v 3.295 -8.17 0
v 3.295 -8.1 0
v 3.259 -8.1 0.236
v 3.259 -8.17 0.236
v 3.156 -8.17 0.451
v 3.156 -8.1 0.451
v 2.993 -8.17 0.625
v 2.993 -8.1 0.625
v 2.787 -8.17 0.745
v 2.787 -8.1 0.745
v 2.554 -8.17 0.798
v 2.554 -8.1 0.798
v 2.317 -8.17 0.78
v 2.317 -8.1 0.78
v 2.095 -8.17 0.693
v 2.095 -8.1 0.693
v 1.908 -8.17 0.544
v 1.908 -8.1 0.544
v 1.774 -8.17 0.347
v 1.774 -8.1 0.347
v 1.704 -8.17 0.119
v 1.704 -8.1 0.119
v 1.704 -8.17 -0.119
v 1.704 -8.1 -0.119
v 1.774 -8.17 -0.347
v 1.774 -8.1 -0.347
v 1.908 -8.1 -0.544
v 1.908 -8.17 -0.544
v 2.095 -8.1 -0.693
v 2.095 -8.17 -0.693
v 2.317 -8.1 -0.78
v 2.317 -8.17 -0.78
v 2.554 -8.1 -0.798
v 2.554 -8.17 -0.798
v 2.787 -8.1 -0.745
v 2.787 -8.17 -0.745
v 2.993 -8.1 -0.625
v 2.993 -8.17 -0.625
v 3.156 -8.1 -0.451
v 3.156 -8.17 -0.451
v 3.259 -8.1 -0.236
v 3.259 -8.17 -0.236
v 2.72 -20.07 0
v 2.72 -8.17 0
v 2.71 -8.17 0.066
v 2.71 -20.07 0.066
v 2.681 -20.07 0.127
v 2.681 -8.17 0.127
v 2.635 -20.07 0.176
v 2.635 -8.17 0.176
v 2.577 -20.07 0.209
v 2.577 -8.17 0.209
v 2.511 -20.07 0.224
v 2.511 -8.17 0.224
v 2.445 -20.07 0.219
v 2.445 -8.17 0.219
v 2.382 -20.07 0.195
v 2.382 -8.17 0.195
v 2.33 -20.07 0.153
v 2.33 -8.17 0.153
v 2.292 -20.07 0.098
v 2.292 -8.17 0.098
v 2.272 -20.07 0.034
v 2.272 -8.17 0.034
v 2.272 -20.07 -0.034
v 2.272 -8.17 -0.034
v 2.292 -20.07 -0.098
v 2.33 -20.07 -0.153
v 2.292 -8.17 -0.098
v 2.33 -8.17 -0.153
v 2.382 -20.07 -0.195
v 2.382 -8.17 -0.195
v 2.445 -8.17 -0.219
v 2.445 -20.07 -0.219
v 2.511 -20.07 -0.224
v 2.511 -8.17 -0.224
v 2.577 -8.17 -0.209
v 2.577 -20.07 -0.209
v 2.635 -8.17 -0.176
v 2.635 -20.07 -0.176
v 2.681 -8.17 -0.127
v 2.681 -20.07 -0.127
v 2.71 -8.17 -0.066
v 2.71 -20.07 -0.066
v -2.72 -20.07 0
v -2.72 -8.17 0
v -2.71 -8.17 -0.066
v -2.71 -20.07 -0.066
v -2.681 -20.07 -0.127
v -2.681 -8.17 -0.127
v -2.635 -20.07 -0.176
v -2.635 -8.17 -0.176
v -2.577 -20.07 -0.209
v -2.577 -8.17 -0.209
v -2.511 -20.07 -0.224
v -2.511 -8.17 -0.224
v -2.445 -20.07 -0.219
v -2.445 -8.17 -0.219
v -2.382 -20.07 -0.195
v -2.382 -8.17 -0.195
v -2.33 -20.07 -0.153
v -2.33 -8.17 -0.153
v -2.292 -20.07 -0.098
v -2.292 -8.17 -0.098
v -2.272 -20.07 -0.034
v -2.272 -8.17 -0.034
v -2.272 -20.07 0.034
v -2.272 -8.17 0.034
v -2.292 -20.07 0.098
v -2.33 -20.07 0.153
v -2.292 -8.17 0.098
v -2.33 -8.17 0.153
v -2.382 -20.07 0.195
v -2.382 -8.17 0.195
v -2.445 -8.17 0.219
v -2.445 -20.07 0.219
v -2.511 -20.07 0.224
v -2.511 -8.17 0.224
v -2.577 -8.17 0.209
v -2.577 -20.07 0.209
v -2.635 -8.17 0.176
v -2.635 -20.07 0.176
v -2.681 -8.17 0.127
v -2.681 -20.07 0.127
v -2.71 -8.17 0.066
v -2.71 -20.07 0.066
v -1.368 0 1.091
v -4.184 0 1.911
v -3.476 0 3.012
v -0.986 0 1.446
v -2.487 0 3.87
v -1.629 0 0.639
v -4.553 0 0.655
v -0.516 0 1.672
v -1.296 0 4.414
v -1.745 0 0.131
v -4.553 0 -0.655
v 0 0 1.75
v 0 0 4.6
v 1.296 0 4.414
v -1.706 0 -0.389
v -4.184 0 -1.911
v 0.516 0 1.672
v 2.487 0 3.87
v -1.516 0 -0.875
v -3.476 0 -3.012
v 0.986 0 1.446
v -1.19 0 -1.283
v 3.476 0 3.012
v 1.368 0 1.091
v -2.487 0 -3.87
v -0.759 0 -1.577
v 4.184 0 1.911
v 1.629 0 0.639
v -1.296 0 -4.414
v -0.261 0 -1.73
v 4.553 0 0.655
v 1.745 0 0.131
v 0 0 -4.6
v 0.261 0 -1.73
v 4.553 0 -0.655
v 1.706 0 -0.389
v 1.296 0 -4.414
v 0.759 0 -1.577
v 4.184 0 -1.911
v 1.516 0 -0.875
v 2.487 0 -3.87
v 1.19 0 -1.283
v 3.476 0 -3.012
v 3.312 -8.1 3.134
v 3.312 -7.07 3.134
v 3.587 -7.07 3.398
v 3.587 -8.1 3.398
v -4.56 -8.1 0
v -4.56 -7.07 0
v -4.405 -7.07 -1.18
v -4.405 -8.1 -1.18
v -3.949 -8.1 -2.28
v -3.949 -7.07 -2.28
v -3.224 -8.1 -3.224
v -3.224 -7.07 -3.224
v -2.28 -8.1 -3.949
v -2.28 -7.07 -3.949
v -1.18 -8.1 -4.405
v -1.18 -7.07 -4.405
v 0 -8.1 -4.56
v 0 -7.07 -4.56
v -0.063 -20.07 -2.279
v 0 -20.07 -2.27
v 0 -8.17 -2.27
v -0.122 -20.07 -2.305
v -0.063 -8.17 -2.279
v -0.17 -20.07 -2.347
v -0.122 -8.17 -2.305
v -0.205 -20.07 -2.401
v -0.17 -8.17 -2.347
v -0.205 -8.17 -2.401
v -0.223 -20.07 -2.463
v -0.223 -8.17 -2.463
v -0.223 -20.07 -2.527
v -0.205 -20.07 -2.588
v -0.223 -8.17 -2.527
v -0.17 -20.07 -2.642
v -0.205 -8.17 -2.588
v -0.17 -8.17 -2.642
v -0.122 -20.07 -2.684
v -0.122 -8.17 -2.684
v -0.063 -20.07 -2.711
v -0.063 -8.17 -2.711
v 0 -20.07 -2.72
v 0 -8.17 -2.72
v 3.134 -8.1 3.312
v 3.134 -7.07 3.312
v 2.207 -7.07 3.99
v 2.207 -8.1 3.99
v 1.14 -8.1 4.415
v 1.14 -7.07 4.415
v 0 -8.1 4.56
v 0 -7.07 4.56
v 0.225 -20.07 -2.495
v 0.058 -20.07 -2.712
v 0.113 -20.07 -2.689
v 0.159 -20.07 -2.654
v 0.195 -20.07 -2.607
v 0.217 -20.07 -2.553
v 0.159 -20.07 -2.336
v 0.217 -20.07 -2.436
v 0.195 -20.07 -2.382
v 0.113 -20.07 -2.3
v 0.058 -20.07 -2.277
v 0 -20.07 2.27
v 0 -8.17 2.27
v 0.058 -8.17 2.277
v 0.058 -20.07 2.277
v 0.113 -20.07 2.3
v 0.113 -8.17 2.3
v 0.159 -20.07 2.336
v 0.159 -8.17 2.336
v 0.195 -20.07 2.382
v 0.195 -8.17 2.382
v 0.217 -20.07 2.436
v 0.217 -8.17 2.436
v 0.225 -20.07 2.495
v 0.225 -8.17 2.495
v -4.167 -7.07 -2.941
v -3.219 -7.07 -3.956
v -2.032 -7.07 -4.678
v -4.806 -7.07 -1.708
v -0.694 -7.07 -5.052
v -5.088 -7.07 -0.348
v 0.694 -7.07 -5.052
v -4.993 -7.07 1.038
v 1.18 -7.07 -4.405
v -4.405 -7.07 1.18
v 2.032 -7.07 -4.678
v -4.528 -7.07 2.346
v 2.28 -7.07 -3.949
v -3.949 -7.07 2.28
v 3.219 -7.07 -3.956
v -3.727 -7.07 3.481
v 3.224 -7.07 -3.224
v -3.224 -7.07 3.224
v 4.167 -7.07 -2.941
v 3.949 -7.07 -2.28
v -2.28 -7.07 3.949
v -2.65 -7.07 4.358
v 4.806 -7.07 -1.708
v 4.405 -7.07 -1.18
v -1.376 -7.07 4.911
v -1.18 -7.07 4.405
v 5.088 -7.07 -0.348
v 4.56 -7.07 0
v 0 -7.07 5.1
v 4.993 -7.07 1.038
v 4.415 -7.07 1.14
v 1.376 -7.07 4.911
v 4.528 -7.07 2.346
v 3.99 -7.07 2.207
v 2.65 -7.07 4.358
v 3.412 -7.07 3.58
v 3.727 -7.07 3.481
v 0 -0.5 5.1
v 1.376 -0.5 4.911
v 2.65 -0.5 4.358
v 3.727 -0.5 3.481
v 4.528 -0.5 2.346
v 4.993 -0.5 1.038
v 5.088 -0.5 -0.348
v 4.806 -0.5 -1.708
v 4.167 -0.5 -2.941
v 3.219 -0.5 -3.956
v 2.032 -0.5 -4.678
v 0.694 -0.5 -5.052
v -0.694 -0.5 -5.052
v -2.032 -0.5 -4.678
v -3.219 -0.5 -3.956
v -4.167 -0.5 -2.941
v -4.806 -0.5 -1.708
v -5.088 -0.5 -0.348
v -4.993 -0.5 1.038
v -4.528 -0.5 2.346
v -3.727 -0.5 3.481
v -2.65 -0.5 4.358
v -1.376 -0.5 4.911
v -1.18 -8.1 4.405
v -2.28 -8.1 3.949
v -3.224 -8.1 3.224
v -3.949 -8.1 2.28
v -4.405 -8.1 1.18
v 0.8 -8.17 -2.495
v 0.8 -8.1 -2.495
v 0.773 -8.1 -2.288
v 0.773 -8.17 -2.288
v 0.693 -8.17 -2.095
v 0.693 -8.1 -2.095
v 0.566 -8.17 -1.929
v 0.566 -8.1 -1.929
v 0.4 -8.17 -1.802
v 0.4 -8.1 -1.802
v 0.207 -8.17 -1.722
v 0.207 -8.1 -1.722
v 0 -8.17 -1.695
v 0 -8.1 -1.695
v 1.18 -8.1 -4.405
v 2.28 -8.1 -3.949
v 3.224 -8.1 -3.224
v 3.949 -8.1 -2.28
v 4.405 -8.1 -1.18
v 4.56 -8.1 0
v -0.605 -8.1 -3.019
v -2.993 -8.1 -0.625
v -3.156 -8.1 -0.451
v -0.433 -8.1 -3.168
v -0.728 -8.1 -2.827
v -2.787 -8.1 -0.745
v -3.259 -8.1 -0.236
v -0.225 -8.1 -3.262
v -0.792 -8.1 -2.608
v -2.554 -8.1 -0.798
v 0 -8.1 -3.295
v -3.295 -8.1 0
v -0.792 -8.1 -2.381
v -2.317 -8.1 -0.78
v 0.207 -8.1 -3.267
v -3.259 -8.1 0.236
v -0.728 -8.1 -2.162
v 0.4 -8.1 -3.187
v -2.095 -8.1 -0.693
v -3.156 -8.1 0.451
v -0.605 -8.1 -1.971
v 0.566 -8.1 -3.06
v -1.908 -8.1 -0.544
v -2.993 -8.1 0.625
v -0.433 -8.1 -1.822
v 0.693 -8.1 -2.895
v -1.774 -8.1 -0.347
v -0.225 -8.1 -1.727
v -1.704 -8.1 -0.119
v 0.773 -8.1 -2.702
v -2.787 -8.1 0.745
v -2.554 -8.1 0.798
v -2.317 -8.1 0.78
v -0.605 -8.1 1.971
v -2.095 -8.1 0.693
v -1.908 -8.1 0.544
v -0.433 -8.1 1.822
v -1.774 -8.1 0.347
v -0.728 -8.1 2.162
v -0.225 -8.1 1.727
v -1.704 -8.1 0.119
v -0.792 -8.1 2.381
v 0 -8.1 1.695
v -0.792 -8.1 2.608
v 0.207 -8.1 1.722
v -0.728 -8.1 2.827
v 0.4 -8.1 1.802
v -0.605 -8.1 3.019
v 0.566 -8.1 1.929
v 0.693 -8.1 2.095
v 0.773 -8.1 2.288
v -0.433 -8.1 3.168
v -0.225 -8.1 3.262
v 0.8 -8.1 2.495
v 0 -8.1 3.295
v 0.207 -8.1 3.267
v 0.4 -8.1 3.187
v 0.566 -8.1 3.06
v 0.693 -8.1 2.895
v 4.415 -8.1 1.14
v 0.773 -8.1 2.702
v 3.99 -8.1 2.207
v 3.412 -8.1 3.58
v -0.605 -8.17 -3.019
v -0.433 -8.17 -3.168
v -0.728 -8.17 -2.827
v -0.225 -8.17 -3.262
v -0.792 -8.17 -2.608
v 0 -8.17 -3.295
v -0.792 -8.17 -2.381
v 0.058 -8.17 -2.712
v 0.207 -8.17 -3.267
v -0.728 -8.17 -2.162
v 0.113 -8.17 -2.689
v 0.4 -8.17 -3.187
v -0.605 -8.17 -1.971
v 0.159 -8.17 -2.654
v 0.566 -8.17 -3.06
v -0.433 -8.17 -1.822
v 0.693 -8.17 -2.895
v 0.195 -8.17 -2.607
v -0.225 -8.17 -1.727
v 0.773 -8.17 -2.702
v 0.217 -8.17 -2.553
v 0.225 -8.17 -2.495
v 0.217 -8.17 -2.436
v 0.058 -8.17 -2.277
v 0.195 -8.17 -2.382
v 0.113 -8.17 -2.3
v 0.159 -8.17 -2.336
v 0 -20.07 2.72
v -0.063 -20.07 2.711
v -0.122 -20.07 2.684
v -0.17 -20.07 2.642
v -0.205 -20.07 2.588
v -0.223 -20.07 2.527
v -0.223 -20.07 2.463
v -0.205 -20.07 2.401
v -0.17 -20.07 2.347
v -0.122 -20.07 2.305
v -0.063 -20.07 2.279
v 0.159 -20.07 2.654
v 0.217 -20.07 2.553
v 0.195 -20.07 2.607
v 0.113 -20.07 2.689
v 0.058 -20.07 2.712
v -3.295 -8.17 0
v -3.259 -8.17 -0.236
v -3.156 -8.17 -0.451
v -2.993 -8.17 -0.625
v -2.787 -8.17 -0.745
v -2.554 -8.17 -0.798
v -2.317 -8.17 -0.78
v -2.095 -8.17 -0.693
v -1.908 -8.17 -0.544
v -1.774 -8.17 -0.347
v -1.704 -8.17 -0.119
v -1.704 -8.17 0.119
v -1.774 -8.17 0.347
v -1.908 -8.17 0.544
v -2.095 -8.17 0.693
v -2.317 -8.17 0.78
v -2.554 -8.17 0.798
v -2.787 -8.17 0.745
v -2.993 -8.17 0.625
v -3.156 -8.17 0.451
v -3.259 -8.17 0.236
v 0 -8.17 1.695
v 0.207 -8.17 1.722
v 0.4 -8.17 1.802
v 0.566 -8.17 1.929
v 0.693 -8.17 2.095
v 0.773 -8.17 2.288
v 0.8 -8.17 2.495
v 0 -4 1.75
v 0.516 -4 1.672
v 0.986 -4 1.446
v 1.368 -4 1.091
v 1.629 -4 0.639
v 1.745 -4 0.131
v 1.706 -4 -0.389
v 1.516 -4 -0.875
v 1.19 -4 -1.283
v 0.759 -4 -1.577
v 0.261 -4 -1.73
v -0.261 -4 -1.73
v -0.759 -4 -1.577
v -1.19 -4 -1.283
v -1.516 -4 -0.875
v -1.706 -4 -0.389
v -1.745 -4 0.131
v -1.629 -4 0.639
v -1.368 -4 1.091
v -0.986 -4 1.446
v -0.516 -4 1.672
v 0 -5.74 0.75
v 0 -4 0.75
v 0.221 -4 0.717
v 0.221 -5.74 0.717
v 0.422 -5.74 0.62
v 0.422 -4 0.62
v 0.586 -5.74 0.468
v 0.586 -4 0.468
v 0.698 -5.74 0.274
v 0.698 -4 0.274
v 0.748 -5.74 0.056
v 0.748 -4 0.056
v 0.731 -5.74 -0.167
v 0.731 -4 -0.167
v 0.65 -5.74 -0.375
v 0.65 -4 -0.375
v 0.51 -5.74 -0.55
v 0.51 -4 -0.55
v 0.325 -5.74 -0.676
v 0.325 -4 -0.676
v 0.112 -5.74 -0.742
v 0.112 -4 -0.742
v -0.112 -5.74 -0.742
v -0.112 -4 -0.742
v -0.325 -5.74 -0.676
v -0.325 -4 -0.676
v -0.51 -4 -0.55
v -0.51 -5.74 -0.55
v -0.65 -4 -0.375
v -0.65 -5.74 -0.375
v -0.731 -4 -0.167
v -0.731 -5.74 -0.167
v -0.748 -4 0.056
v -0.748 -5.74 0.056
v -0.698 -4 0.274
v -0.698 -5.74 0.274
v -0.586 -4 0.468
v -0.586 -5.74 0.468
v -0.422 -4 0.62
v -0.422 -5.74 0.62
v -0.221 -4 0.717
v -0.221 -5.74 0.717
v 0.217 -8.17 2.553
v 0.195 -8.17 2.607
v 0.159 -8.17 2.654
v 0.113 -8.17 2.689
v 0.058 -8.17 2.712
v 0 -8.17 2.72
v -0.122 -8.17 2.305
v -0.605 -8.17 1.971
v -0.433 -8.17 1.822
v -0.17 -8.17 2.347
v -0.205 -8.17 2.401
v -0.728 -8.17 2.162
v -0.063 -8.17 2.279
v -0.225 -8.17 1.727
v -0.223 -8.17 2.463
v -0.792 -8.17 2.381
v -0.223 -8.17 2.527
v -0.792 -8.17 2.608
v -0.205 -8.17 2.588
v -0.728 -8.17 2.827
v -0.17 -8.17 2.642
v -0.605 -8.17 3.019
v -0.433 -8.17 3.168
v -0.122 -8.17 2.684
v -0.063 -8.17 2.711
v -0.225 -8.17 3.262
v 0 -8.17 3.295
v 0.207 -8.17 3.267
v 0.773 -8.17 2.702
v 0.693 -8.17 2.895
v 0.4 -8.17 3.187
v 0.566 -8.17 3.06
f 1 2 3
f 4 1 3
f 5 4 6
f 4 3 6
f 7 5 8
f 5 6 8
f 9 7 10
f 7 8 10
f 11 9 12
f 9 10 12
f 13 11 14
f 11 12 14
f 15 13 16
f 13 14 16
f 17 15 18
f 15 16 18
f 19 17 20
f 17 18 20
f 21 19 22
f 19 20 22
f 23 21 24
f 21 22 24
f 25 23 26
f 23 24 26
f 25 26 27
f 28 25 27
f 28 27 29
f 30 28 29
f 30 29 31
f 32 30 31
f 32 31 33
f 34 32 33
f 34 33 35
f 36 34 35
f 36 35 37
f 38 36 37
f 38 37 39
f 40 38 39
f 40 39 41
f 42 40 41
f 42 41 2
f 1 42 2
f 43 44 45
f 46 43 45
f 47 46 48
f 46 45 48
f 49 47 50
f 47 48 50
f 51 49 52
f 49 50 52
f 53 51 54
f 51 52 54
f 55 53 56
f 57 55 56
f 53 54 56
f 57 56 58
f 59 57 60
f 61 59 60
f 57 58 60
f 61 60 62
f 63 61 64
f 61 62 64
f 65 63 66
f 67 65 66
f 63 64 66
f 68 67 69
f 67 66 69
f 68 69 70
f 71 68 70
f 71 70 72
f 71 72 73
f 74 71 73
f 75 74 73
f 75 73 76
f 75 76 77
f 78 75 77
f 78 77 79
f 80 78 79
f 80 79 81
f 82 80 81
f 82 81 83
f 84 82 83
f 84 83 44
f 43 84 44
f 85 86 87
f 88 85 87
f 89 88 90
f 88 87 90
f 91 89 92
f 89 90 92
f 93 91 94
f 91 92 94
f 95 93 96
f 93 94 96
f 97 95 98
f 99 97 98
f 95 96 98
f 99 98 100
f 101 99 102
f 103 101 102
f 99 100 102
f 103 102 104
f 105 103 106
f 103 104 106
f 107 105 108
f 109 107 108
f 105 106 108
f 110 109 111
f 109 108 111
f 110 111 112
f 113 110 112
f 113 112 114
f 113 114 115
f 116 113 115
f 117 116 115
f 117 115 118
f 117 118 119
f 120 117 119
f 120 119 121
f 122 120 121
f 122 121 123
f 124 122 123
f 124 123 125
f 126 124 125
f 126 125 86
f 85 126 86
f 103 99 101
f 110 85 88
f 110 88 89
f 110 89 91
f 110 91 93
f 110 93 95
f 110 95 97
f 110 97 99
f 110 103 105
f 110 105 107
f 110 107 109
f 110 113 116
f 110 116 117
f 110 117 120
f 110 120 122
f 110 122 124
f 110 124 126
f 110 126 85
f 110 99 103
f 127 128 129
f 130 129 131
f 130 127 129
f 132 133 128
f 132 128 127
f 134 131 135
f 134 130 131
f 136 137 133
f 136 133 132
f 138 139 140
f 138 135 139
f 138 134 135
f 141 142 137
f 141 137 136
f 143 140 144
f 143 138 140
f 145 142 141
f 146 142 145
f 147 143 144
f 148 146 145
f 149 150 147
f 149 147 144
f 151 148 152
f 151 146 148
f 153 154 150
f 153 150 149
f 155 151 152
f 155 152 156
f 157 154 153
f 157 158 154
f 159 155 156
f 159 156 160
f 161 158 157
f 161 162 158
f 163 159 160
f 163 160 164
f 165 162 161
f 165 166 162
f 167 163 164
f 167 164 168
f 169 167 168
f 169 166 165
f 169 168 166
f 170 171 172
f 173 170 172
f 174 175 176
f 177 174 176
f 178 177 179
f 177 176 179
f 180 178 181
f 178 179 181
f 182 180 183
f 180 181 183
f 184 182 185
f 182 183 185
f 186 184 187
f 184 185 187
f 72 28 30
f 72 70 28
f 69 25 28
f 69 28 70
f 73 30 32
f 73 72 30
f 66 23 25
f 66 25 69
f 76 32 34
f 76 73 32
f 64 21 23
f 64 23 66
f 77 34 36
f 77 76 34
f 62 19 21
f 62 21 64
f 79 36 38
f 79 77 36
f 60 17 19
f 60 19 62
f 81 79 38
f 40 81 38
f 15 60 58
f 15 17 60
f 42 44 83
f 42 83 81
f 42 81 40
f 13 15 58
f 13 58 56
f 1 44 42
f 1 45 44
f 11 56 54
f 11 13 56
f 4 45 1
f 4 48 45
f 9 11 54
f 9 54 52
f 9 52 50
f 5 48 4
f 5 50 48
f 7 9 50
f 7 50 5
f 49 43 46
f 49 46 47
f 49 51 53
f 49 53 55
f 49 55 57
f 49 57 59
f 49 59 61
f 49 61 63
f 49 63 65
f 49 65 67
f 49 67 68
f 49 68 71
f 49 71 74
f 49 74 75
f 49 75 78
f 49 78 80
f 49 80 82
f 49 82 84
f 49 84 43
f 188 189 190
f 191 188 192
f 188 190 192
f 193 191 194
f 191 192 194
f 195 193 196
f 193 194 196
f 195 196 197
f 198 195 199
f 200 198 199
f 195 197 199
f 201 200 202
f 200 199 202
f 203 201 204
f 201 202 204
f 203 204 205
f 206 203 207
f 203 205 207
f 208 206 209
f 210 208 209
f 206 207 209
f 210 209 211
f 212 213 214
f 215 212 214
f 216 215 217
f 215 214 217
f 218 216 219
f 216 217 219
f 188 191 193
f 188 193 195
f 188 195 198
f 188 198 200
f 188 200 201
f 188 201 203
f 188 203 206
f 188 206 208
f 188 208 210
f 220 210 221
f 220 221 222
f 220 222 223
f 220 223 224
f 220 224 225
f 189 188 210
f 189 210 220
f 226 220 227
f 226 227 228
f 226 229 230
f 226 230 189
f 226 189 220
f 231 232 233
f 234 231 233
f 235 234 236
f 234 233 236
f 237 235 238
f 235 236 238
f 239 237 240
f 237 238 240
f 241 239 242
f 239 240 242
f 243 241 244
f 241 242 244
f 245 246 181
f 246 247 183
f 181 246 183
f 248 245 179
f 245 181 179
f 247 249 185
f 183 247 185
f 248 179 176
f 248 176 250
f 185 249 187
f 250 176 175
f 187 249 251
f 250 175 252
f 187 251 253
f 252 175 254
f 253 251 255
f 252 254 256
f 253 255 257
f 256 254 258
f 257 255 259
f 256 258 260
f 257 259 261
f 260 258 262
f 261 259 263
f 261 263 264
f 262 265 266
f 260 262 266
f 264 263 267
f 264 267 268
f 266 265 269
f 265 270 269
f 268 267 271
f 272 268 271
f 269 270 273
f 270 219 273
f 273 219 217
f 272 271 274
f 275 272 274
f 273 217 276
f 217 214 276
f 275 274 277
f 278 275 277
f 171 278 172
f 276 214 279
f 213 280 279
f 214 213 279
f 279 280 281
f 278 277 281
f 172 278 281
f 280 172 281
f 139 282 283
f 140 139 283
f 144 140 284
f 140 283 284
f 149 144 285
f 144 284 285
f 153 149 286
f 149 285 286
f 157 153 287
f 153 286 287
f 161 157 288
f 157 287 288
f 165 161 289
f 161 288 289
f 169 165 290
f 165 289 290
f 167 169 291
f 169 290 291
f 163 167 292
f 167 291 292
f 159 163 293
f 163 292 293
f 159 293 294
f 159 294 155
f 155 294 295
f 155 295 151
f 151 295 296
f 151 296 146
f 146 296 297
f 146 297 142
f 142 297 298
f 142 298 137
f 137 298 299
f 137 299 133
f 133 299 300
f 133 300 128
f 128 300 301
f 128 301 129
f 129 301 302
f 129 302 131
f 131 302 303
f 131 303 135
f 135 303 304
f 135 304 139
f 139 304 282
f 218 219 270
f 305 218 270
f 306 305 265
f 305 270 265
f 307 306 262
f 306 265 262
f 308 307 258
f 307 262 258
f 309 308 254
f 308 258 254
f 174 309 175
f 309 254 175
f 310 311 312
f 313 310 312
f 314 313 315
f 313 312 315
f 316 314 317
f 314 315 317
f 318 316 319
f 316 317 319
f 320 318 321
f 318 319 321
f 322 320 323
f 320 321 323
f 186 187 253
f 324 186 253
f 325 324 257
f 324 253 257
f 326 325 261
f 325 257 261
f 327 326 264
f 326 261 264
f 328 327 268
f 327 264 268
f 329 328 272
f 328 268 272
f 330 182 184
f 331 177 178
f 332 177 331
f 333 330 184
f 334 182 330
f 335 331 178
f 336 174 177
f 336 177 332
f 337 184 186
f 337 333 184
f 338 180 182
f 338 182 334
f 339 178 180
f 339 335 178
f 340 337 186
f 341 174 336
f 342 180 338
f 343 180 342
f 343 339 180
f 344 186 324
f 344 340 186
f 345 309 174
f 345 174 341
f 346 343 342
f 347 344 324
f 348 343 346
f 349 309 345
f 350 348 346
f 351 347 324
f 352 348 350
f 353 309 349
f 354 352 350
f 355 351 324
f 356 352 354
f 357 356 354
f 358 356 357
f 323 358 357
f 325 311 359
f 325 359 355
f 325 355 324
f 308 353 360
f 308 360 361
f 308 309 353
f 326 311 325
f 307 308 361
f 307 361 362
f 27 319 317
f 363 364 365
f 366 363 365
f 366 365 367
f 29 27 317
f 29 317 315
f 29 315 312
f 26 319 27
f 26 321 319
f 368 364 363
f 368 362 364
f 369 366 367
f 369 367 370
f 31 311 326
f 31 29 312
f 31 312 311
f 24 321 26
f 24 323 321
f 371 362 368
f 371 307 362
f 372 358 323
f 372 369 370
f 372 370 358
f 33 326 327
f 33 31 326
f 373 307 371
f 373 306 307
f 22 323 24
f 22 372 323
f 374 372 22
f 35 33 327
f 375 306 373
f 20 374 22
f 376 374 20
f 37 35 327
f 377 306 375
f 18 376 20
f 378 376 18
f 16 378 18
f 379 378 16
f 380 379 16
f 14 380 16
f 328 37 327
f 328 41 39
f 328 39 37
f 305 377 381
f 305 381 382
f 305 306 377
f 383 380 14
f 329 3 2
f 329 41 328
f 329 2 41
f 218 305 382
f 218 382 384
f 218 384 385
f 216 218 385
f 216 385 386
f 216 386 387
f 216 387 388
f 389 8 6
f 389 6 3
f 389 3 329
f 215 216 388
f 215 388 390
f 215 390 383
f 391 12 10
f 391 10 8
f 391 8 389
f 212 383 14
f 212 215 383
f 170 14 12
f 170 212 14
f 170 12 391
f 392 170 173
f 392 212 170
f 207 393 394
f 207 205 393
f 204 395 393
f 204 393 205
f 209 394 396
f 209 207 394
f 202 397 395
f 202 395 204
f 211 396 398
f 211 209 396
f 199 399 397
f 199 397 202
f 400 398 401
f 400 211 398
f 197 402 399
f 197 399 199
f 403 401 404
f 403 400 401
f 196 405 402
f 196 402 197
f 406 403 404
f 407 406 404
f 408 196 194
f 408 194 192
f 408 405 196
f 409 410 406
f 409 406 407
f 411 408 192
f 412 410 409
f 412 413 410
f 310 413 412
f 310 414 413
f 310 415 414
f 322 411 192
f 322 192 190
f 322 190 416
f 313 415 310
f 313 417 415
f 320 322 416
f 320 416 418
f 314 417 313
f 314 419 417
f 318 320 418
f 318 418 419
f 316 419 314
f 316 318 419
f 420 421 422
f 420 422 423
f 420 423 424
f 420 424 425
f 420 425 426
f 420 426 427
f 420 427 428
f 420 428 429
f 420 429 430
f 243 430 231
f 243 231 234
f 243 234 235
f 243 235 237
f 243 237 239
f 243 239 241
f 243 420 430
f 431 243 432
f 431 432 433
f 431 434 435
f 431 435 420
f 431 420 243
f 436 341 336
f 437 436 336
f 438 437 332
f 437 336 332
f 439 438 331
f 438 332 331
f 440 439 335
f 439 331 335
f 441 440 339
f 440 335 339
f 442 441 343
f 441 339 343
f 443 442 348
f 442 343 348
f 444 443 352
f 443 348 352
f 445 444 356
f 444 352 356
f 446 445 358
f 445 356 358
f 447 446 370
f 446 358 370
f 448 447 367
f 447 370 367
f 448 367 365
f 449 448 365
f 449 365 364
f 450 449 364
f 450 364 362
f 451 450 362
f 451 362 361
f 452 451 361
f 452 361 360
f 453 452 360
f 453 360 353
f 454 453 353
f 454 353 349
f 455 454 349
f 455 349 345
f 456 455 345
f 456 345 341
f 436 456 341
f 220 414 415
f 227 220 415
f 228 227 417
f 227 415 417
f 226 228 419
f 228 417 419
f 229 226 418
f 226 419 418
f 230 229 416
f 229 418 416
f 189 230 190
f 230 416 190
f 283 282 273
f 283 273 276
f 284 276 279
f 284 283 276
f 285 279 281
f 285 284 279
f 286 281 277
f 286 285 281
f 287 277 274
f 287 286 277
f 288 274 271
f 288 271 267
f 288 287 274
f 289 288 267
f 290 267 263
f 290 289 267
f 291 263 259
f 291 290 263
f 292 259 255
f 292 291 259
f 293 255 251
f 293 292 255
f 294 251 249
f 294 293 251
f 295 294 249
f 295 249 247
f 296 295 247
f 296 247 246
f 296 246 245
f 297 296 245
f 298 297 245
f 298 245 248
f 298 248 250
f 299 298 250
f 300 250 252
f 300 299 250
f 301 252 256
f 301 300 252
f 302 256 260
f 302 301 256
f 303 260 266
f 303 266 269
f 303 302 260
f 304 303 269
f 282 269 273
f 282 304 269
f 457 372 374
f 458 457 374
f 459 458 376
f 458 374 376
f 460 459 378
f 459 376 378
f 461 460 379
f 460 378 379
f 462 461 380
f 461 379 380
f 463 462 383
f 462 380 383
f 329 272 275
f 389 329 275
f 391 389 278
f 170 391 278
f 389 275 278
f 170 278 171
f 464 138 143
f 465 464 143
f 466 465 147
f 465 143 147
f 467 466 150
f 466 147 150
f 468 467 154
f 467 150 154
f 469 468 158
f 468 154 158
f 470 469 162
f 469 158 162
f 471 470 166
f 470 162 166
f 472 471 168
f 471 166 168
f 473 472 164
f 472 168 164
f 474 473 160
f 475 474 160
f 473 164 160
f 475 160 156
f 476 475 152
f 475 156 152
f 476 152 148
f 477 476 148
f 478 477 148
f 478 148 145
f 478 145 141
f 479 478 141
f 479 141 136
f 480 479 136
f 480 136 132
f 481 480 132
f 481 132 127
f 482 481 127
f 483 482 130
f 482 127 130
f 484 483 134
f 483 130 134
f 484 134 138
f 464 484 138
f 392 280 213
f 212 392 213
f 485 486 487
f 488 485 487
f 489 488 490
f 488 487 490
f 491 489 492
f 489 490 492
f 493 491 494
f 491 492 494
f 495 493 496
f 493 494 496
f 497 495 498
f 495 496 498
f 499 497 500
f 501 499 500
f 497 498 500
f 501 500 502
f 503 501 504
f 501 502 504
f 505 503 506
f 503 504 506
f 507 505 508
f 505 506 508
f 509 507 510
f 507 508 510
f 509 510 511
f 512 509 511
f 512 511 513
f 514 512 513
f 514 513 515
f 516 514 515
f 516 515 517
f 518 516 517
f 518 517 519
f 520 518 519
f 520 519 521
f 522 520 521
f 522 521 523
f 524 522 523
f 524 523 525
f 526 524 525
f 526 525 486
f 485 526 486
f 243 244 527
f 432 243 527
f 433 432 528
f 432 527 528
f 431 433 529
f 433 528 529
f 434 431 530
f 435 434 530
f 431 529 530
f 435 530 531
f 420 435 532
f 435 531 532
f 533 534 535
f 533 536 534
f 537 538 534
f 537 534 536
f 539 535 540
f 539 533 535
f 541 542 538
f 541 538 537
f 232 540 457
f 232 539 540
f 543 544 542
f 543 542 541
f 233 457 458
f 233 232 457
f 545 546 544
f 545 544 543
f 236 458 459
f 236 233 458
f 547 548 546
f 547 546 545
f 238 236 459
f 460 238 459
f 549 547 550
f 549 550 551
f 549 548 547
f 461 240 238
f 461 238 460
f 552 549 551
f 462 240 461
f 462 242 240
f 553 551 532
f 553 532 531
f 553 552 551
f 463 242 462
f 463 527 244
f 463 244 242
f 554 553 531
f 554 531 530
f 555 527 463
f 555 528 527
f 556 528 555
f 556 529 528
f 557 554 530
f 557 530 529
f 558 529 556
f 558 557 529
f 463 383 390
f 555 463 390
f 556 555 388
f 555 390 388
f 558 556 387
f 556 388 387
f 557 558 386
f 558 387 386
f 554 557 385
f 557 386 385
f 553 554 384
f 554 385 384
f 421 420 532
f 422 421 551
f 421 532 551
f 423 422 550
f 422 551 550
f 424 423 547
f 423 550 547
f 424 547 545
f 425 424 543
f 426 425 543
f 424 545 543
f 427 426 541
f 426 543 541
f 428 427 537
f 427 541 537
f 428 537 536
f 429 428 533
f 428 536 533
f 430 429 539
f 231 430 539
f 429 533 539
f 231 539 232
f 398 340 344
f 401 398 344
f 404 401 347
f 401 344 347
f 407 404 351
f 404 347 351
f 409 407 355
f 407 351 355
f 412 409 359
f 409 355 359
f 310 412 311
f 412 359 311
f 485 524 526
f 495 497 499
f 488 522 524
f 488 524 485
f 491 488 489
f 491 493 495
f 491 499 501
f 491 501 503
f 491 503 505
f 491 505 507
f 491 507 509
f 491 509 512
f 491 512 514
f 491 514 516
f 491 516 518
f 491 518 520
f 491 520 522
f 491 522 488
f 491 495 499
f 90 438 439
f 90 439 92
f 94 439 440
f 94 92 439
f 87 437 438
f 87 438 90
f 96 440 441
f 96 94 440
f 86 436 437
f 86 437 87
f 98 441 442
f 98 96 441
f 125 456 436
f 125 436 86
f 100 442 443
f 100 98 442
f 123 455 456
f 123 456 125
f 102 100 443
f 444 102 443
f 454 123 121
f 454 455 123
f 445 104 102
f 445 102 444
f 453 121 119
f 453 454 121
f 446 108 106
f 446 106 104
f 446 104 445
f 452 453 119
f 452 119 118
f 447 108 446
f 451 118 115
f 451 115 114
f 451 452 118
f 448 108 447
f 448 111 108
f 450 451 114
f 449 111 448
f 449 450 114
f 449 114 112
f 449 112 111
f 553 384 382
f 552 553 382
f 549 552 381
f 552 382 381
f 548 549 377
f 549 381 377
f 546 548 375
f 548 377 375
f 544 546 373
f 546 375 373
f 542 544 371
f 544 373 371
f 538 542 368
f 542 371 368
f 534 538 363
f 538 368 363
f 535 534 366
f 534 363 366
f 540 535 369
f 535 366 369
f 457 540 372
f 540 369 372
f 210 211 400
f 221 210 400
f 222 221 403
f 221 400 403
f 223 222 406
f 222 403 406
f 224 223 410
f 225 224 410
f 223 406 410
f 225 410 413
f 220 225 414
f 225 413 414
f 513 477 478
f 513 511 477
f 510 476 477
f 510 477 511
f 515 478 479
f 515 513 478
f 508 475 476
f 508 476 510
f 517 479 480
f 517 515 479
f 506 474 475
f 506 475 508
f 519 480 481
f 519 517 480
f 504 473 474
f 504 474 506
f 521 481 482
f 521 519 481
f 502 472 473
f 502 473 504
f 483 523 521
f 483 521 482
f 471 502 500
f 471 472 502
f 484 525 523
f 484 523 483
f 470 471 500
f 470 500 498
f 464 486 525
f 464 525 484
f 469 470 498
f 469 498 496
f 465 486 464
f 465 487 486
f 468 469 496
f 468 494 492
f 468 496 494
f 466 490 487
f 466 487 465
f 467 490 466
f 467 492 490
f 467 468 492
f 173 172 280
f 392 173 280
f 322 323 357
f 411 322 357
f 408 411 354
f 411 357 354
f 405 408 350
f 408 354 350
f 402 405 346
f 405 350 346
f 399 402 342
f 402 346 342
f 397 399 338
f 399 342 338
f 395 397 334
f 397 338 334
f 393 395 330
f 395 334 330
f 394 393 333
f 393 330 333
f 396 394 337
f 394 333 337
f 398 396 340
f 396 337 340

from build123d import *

# Parameters (mm, degrees)
SKETCH1_R           = 5.1
SKETCH1_R_2         = 4.6
SKETCH1_R_3         = 1.75
SKETCH1_R_4         = 0.75
BOSS_EXTRUDE1_DEPTH = 7.07
SKETCH1_5_R         = 0.75
CUT_EXTRUDE1_DEPTH  = 5.74
SKETCH1_6_R         = 1.75
SKETCH1_6_R_2       = 0.75
CUT_EXTRUDE2_DEPTH  = 4
CHAMFER1_SIZE       = 0.5
BOSS_EXTRUDE3_DEPTH = 1.03
BOSS_EXTRUDE4_DEPTH = 1.1
BOSS_EXTRUDE5_DEPTH = 13
BOSS_EXTRUDE6_START = -1.03
BOSS_EXTRUDE6_DEPTH = 1.03


with BuildPart() as part:
    # Sketch1 → Boss-Extrude1 (new body)
    # profile 1 of 4: a face of its own
    with BuildSketch(Plane(origin=(0, 0, 0), x_dir=(1, 0, 0), z_dir=(0, 1, 0))):
        with Locations(Location((0, 0, 0), (0, 0, 270))):
            Circle(SKETCH1_R)
        Circle(SKETCH1_R_2, mode=Mode.SUBTRACT)
    # profile 2 of 4: a face of its own
    with BuildSketch(Plane(origin=(0, 0, 0), x_dir=(1, 0, 0), z_dir=(0, 1, 0))):
        Circle(SKETCH1_R_2)
        Circle(SKETCH1_R_3, mode=Mode.SUBTRACT)
    # profile 3 of 4: a face of its own
    with BuildSketch(Plane(origin=(0, 0, 0), x_dir=(1, 0, 0), z_dir=(0, 1, 0))):
        Circle(SKETCH1_R_3)
        Circle(SKETCH1_R_4, mode=Mode.SUBTRACT)
    # profile 4 of 4: a face of its own
    with BuildSketch(Plane(origin=(0, 0, 0), x_dir=(1, 0, 0), z_dir=(0, 1, 0))):
        Circle(SKETCH1_R_4)
    extrude(amount=-BOSS_EXTRUDE1_DEPTH)

    # Sketch1<5> → Cut-Extrude1 (cut)
    with BuildSketch(Plane(origin=(0, 0, 0), x_dir=(1, 0, 0), z_dir=(0, 1, 0))):
        with Locations(Location((0, 0, 0), (0, 0, 270))):
            Circle(SKETCH1_5_R)
    extrude(amount=-CUT_EXTRUDE1_DEPTH, mode=Mode.SUBTRACT)

    # Sketch1<6> → Cut-Extrude2 (cut)
    with BuildSketch(Plane(origin=(0, 0, 0), x_dir=(1, 0, 0), z_dir=(0, 1, 0))):
        with Locations(Location((0, 0, 0), (0, 0, 270))):
            Circle(SKETCH1_6_R)
        with Locations(Location((0, 0, 0), (0, 0, 270))):
            Circle(SKETCH1_6_R_2, mode=Mode.SUBTRACT)
    extrude(amount=-CUT_EXTRUDE2_DEPTH, mode=Mode.SUBTRACT)

    # Chamfer1
    chamfer1_edges = [part.edges().sort_by_distance(p)[0] for p in [
        (0, 0, -5.1),
    ]]
    chamfer(chamfer1_edges, length=CHAMFER1_SIZE)

    # Sketch2 → Boss-Extrude3 (add)
    with BuildSketch(Plane.XZ.offset(7.07)):
        with BuildLine():
            ThreePointArc((-2.269632805, 0), (-2.494632805, 0.225), (-2.719632805, 0))
            Line((-2.719632805, 0), (-2.269632805, 0))
        make_face()
        with BuildLine():
            Line((-2.269632805, 0), (-2.719632805, 0))
            ThreePointArc((-2.719632805, 0), (-2.494632805, -0.225), (-2.269632805, 0))
        make_face()
        with BuildLine():
            ThreePointArc((-1.694632805, 0), (-2.494632805, 0.8), (-3.294632805, 0))
            Line((-3.294632805, 0), (-2.719632805, 0))
            ThreePointArc((-2.719632805, 0), (-2.494632805, 0.225), (-2.269632805, 0))
            Line((-2.269632805, 0), (-1.694632805, 0))
        make_face()
        with BuildLine():
            Line((-2.719632805, 0), (-3.294632805, 0))
            ThreePointArc((-3.294632805, 0), (-2.494632805, -0.8), (-1.694632805, 0))
            Line((-1.694632805, 0), (-2.269632805, 0))
            ThreePointArc((-2.269632805, 0), (-2.494632805, -0.225), (-2.719632805, 0))
        make_face()
        with BuildLine():
            ThreePointArc((0, -1.694632805), (-0.8, -2.494632805), (0, -3.294632805))
            Line((0, -3.294632805), (0, -2.719632805))
            ThreePointArc((0, -2.719632805), (-0.225, -2.494632805), (0, -2.269632805))
            Line((0, -2.269632805), (0, -1.694632805))
        make_face()
        with BuildLine():
            Line((0, -2.719632805), (0, -3.294632805))
            ThreePointArc((0, -3.294632805), (0.565685425, -3.06031823), (0.8, -2.494632805))
            ThreePointArc((0.8, -2.494632805), (0.565685425, -1.92894738), (0, -1.694632805))
            Line((0, -1.694632805), (0, -2.269632805))
            ThreePointArc((0, -2.269632805), (0.159099026, -2.335533779), (0.225, -2.494632805))
            ThreePointArc((0.225, -2.494632805), (0.159099026, -2.653731831), (0, -2.719632805))
        make_face()
        with BuildLine():
            ThreePointArc((0, -2.269632805), (-0.225, -2.494632805), (0, -2.719632805))
            Line((0, -2.719632805), (0, -2.269632805))
        make_face()
        with BuildLine():
            Line((0, -2.269632805), (0, -2.719632805))
            ThreePointArc((0, -2.719632805), (0.159099026, -2.653731831), (0.225, -2.494632805))
            ThreePointArc((0.225, -2.494632805), (0.159099026, -2.335533779), (0, -2.269632805))
        make_face()
        with BuildLine():
            ThreePointArc((0.225, 2.494632805), (0.159099026, 2.653731831), (0, 2.719632805))
            Line((0, 2.719632805), (0, 2.269632805))
            ThreePointArc((0, 2.269632805), (0.159099026, 2.335533779), (0.225, 2.494632805))
        make_face()
        with BuildLine():
            Line((0, 2.269632805), (0, 2.719632805))
            ThreePointArc((0, 2.719632805), (-0.225, 2.494632805), (0, 2.269632805))
        make_face()
        with BuildLine():
            ThreePointArc((0.8, 2.494632805), (0.565685425, 3.06031823), (0, 3.294632805))
            Line((0, 3.294632805), (0, 2.719632805))
            ThreePointArc((0, 2.719632805), (0.159099026, 2.653731831), (0.225, 2.494632805))
            ThreePointArc((0.225, 2.494632805), (0.159099026, 2.335533779), (0, 2.269632805))
            Line((0, 2.269632805), (0, 1.694632805))
            ThreePointArc((0, 1.694632805), (0.565685425, 1.92894738), (0.8, 2.494632805))
        make_face()
        with BuildLine():
            Line((0, 2.719632805), (0, 3.294632805))
            ThreePointArc((0, 3.294632805), (-0.8, 2.494632805), (0, 1.694632805))
            Line((0, 1.694632805), (0, 2.269632805))
            ThreePointArc((0, 2.269632805), (-0.225, 2.494632805), (0, 2.719632805))
        make_face()
        with BuildLine():
            ThreePointArc((2.269632805, 0), (2.494632805, -0.225), (2.719632805, 0))
            Line((2.719632805, 0), (2.269632805, 0))
        make_face()
        with BuildLine():
            Line((2.269632805, 0), (2.719632805, 0))
            ThreePointArc((2.719632805, 0), (2.494632805, 0.225), (2.269632805, 0))
        make_face()
        with BuildLine():
            ThreePointArc((1.694632805, 0), (2.494632805, -0.8), (3.294632805, 0))
            Line((3.294632805, 0), (2.719632805, 0))
            ThreePointArc((2.719632805, 0), (2.494632805, -0.225), (2.269632805, 0))
            Line((2.269632805, 0), (1.694632805, 0))
        make_face()
        with BuildLine():
            Line((2.719632805, 0), (3.294632805, 0))
            ThreePointArc((3.294632805, 0), (2.494632805, 0.8), (1.694632805, 0))
            Line((1.694632805, 0), (2.269632805, 0))
            ThreePointArc((2.269632805, 0), (2.494632805, 0.225), (2.719632805, 0))
        make_face()
        with BuildLine():
            Line((0, 3.294632805), (0, 4.56))
            ThreePointArc((0, 4.56), (-3.224406922, 3.224406922), (-4.56, 0))
            Line((-4.56, 0), (-3.294632805, 0))
            ThreePointArc((-3.294632805, 0), (-2.494632805, 0.8), (-1.694632805, 0))
            Line((-1.694632805, 0), (0, 0))
            Line((0, 0), (0, 1.694632805))
            ThreePointArc((0, 1.694632805), (-0.8, 2.494632805), (0, 3.294632805))
        make_face()
        with BuildLine():
            Line((-3.294632805, 0), (-4.56, 0))
            ThreePointArc((-4.56, 0), (-3.224406922, -3.224406922), (0, -4.56))
            Line((0, -4.56), (0, -3.294632805))
            ThreePointArc((0, -3.294632805), (-0.8, -2.494632805), (0, -1.694632805))
            Line((0, -1.694632805), (0, 0))
            Line((0, 0), (-1.694632805, 0))
            ThreePointArc((-1.694632805, 0), (-2.494632805, -0.8), (-3.294632805, 0))
        make_face()
        with BuildLine():
            ThreePointArc((0, -4.56), (3.224406922, -3.224406922), (4.56, 0))
            Line((4.56, 0), (3.294632805, 0))
            ThreePointArc((3.294632805, 0), (2.494632805, -0.8), (1.694632805, 0))
            Line((1.694632805, 0), (0, 0))
            Line((0, 0), (0, -1.694632805))
            ThreePointArc((0, -1.694632805), (0.565685425, -1.92894738), (0.8, -2.494632805))
            ThreePointArc((0.8, -2.494632805), (0.565685425, -3.06031823), (0, -3.294632805))
            Line((0, -3.294632805), (0, -4.56))
        make_face()
        with BuildLine():
            ThreePointArc((3.201624221, 3.247029773), (1.730194243, 4.219007926), (0, 4.56))
            Line((0, 4.56), (0, 3.294632805))
            ThreePointArc((0, 3.294632805), (0.565685425, 3.06031823), (0.8, 2.494632805))
            ThreePointArc((0.8, 2.494632805), (0.565685425, 1.92894738), (0, 1.694632805))
            Line((0, 1.694632805), (0, 0))
            Line((0, 0), (1.694632805, 0))
            ThreePointArc((1.694632805, 0), (2.494632805, 0.8), (3.294632805, 0))
            Line((3.294632805, 0), (4.56, 0))
            ThreePointArc((4.56, 0), (4.206721196, 1.759857033), (3.201624221, 3.247029773))
        make_face()
    extrude(amount=BOSS_EXTRUDE3_DEPTH)

    # Sketch2<3> → Boss-Extrude4 (add)
    with BuildSketch(Plane.XZ.offset(7.07)):
        with BuildLine():
            ThreePointArc((-1.694632805, 0), (-2.494632805, 0.8), (-3.294632805, 0))
            Line((-3.294632805, 0), (-2.719632805, 0))
            ThreePointArc((-2.719632805, 0), (-2.494632805, 0.225), (-2.269632805, 0))
            Line((-2.269632805, 0), (-1.694632805, 0))
        make_face()
        with BuildLine():
            Line((-2.719632805, 0), (-3.294632805, 0))
            ThreePointArc((-3.294632805, 0), (-2.494632805, -0.8), (-1.694632805, 0))
            Line((-1.694632805, 0), (-2.269632805, 0))
            ThreePointArc((-2.269632805, 0), (-2.494632805, -0.225), (-2.719632805, 0))
        make_face()
        with BuildLine():
            ThreePointArc((-2.269632805, 0), (-2.494632805, 0.225), (-2.719632805, 0))
            Line((-2.719632805, 0), (-2.269632805, 0))
        make_face()
        with BuildLine():
            Line((-2.269632805, 0), (-2.719632805, 0))
            ThreePointArc((-2.719632805, 0), (-2.494632805, -0.225), (-2.269632805, 0))
        make_face()
        with BuildLine():
            ThreePointArc((0, -2.269632805), (-0.225, -2.494632805), (0, -2.719632805))
            Line((0, -2.719632805), (0, -2.269632805))
        make_face()
        with BuildLine():
            Line((0, -2.269632805), (0, -2.719632805))
            ThreePointArc((0, -2.719632805), (0.159099026, -2.653731831), (0.225, -2.494632805))
            ThreePointArc((0.225, -2.494632805), (0.159099026, -2.335533779), (0, -2.269632805))
        make_face()
        with BuildLine():
            ThreePointArc((0, -1.694632805), (-0.8, -2.494632805), (0, -3.294632805))
            Line((0, -3.294632805), (0, -2.719632805))
            ThreePointArc((0, -2.719632805), (-0.225, -2.494632805), (0, -2.269632805))
            Line((0, -2.269632805), (0, -1.694632805))
        make_face()
        with BuildLine():
            Line((0, -2.719632805), (0, -3.294632805))
            ThreePointArc((0, -3.294632805), (0.565685425, -3.06031823), (0.8, -2.494632805))
            ThreePointArc((0.8, -2.494632805), (0.565685425, -1.92894738), (0, -1.694632805))
            Line((0, -1.694632805), (0, -2.269632805))
            ThreePointArc((0, -2.269632805), (0.159099026, -2.335533779), (0.225, -2.494632805))
            ThreePointArc((0.225, -2.494632805), (0.159099026, -2.653731831), (0, -2.719632805))
        make_face()
        with BuildLine():
            ThreePointArc((2.269632805, 0), (2.494632805, -0.225), (2.719632805, 0))
            Line((2.719632805, 0), (2.269632805, 0))
        make_face()
        with BuildLine():
            Line((2.269632805, 0), (2.719632805, 0))
            ThreePointArc((2.719632805, 0), (2.494632805, 0.225), (2.269632805, 0))
        make_face()
        with BuildLine():
            ThreePointArc((1.694632805, 0), (2.494632805, -0.8), (3.294632805, 0))
            Line((3.294632805, 0), (2.719632805, 0))
            ThreePointArc((2.719632805, 0), (2.494632805, -0.225), (2.269632805, 0))
            Line((2.269632805, 0), (1.694632805, 0))
        make_face()
        with BuildLine():
            Line((2.719632805, 0), (3.294632805, 0))
            ThreePointArc((3.294632805, 0), (2.494632805, 0.8), (1.694632805, 0))
            Line((1.694632805, 0), (2.269632805, 0))
            ThreePointArc((2.269632805, 0), (2.494632805, 0.225), (2.719632805, 0))
        make_face()
        with BuildLine():
            ThreePointArc((0.225, 2.494632805), (0.159099026, 2.653731831), (0, 2.719632805))
            Line((0, 2.719632805), (0, 2.269632805))
            ThreePointArc((0, 2.269632805), (0.159099026, 2.335533779), (0.225, 2.494632805))
        make_face()
        with BuildLine():
            Line((0, 2.269632805), (0, 2.719632805))
            ThreePointArc((0, 2.719632805), (-0.225, 2.494632805), (0, 2.269632805))
        make_face()
        with BuildLine():
            ThreePointArc((0.8, 2.494632805), (0.565685425, 3.06031823), (0, 3.294632805))
            Line((0, 3.294632805), (0, 2.719632805))
            ThreePointArc((0, 2.719632805), (0.159099026, 2.653731831), (0.225, 2.494632805))
            ThreePointArc((0.225, 2.494632805), (0.159099026, 2.335533779), (0, 2.269632805))
            Line((0, 2.269632805), (0, 1.694632805))
            ThreePointArc((0, 1.694632805), (0.565685425, 1.92894738), (0.8, 2.494632805))
        make_face()
        with BuildLine():
            Line((0, 2.719632805), (0, 3.294632805))
            ThreePointArc((0, 3.294632805), (-0.8, 2.494632805), (0, 1.694632805))
            Line((0, 1.694632805), (0, 2.269632805))
            ThreePointArc((0, 2.269632805), (-0.225, 2.494632805), (0, 2.719632805))
        make_face()
    extrude(amount=BOSS_EXTRUDE4_DEPTH)

    # Sketch2<4> → Boss-Extrude5 (add)
    with BuildSketch(Plane.XZ.offset(7.07)):
        with BuildLine():
            ThreePointArc((-2.269632805, 0), (-2.494632805, 0.225), (-2.719632805, 0))
            Line((-2.719632805, 0), (-2.269632805, 0))
        make_face()
        with BuildLine():
            Line((-2.269632805, 0), (-2.719632805, 0))
            ThreePointArc((-2.719632805, 0), (-2.494632805, -0.225), (-2.269632805, 0))
        make_face()
        with BuildLine():
            ThreePointArc((0.225, 2.494632805), (0.159099026, 2.653731831), (0, 2.719632805))
            Line((0, 2.719632805), (0, 2.269632805))
            ThreePointArc((0, 2.269632805), (0.159099026, 2.335533779), (0.225, 2.494632805))
        make_face()
        with BuildLine():
            Line((0, 2.269632805), (0, 2.719632805))
            ThreePointArc((0, 2.719632805), (-0.225, 2.494632805), (0, 2.269632805))
        make_face()
        with BuildLine():
            ThreePointArc((2.269632805, 0), (2.494632805, -0.225), (2.719632805, 0))
            Line((2.719632805, 0), (2.269632805, 0))
        make_face()
        with BuildLine():
            Line((2.269632805, 0), (2.719632805, 0))
            ThreePointArc((2.719632805, 0), (2.494632805, 0.225), (2.269632805, 0))
        make_face()
        with BuildLine():
            ThreePointArc((0, -2.269632805), (-0.225, -2.494632805), (0, -2.719632805))
            Line((0, -2.719632805), (0, -2.269632805))
        make_face()
        with BuildLine():
            Line((0, -2.269632805), (0, -2.719632805))
            ThreePointArc((0, -2.719632805), (0.159099026, -2.653731831), (0.225, -2.494632805))
            ThreePointArc((0.225, -2.494632805), (0.159099026, -2.335533779), (0, -2.269632805))
        make_face()
    extrude(amount=BOSS_EXTRUDE5_DEPTH)

    # Sketch4 → Boss-Extrude6 (add)
    with BuildSketch(Plane.XZ.offset(8.1).offset(BOSS_EXTRUDE6_START)):
        with BuildLine():
            Line((3.412284181, 3.579752451), (3.134148267, 3.312206914))
            ThreePointArc((3.134148267, 3.312206914), (3.179580669, 3.26861848), (3.224406922, 3.224406922))
            ThreePointArc((3.224406922, 3.224406922), (3.268594957, 3.179604851), (3.31216054, 3.134197275))
            Line((3.31216054, 3.134197275), (3.58677462, 3.398355077))
            Line((3.58677462, 3.398355077), (3.412284181, 3.579752451))
        make_face()
    extrude(amount=BOSS_EXTRUDE6_DEPTH)


solid = part.part
